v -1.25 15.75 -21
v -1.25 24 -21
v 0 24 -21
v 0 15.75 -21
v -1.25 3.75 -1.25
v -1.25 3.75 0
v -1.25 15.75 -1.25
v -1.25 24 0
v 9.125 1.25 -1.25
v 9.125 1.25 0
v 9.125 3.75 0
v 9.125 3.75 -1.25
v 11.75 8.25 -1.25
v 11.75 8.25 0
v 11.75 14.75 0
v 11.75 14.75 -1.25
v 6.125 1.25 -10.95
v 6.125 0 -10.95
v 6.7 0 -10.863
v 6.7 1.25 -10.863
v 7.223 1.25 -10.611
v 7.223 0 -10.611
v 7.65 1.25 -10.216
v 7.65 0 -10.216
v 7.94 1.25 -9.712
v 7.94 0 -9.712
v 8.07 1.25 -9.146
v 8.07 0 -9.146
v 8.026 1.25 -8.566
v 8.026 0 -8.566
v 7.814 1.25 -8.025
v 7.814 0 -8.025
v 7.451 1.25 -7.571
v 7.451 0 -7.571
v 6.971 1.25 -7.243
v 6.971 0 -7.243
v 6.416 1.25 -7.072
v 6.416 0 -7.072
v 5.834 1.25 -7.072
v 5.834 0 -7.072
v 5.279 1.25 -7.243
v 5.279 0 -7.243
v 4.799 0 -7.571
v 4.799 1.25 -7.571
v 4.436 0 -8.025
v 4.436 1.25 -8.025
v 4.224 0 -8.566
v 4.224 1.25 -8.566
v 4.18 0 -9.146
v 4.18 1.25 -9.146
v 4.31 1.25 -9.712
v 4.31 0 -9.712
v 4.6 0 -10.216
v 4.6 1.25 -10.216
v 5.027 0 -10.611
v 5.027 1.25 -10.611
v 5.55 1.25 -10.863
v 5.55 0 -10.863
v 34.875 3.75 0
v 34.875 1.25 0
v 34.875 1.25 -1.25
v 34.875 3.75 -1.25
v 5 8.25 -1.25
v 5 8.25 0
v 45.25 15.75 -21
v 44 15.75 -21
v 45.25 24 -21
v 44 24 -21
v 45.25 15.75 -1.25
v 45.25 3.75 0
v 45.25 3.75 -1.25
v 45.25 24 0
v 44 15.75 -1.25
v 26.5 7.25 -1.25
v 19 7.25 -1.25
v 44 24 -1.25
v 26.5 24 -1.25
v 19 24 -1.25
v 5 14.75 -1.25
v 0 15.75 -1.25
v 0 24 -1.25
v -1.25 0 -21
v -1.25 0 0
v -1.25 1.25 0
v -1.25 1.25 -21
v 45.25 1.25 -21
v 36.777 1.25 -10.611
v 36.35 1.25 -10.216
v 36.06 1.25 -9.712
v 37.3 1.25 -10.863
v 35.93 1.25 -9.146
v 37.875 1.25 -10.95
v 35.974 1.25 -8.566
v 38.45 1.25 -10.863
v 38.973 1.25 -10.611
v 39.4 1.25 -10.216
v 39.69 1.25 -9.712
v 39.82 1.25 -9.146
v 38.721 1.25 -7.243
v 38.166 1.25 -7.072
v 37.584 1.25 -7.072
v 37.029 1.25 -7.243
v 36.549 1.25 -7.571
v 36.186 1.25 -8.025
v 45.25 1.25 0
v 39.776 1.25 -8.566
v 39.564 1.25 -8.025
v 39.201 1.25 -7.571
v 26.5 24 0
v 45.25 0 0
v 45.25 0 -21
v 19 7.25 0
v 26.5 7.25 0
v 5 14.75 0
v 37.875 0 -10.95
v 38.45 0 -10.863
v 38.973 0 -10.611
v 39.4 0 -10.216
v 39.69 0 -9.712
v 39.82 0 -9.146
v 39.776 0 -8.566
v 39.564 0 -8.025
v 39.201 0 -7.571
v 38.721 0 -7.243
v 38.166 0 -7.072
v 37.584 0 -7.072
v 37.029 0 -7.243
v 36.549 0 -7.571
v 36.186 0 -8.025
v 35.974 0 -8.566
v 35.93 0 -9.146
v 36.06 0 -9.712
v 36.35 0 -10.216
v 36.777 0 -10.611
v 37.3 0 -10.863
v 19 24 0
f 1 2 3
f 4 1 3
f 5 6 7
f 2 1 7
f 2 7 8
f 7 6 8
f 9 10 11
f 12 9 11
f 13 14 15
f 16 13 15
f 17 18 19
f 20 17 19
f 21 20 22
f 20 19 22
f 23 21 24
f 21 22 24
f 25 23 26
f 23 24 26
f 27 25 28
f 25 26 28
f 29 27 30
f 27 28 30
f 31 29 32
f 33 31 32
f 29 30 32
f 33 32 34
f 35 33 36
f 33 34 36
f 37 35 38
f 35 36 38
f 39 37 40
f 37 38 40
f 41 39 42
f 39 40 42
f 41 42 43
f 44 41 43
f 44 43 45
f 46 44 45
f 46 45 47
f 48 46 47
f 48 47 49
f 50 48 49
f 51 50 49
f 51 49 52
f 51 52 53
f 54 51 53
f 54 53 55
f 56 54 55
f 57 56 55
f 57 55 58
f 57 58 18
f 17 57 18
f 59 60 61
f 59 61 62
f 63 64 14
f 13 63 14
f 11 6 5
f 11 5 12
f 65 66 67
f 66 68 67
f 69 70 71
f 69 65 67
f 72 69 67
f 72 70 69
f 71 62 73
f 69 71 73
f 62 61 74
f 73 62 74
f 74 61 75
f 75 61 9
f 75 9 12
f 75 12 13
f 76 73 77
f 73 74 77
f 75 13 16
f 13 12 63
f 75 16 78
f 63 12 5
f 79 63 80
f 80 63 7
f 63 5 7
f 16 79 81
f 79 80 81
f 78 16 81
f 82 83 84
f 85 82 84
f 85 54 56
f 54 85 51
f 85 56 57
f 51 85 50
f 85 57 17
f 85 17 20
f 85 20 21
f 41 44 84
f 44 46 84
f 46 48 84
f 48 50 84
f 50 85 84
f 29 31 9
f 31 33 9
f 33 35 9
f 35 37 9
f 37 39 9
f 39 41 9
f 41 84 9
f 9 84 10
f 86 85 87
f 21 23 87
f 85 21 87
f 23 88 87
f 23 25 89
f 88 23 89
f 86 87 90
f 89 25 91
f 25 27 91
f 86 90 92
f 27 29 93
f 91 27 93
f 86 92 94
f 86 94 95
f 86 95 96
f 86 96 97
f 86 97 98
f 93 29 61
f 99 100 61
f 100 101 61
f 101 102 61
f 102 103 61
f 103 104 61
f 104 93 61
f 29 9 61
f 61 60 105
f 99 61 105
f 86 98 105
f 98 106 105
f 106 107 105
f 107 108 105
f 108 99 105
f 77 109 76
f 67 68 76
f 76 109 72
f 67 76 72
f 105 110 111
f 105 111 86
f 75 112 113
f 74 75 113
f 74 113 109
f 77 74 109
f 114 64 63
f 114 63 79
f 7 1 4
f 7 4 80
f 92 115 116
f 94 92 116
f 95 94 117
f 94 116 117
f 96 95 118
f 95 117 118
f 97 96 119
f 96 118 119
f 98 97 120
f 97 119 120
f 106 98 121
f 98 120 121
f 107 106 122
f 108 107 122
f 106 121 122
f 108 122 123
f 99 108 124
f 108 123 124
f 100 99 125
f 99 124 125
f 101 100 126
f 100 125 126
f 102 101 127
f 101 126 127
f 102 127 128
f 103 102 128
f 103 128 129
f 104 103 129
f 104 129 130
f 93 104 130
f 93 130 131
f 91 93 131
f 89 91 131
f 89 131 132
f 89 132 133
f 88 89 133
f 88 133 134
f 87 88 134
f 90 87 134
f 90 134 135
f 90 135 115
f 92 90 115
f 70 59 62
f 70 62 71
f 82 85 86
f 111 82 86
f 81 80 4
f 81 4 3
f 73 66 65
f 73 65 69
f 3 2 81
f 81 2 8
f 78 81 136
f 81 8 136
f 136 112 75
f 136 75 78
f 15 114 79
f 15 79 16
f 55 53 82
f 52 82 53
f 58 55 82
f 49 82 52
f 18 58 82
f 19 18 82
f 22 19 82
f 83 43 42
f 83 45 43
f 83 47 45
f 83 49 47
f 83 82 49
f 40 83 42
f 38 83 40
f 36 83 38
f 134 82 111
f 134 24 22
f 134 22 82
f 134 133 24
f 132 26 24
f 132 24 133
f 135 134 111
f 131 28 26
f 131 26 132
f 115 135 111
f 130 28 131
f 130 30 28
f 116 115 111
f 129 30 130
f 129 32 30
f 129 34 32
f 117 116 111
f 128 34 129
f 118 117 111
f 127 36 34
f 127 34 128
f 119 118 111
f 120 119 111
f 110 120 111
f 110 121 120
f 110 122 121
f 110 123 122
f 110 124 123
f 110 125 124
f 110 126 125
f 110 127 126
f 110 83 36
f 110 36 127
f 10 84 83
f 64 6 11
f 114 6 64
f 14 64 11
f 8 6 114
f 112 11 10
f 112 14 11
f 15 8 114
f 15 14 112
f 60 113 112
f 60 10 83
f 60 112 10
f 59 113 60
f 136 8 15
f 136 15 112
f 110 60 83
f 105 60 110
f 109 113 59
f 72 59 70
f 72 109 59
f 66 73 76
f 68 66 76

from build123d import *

# Parameters (mm, degrees)
SKETCH1_W           = 46.5
SKETCH1_H           = 24
BOSS_EXTRUDE1_DEPTH = 21
SHELL1_T            = -1.25
SKETCH2_W           = 19.75
SKETCH2_H           = 14.5
CUT_EXTRUDE1_DEPTH  = 57.384838388
SKETCH4_W           = 6.75
SKETCH4_H           = 6.5
SKETCH4_W_2         = 7.5
SKETCH4_H_2         = 17
CUT_EXTRUDE3_DEPTH  = 1.25
CUT_EXTRUDE4_REACH  = 57.358
SKETCH6_R           = 1.95
SKETCH7_W           = 10.375
SKETCH7_H           = 2.5
CUT_EXTRUDE5_DEPTH  = 1.25


with BuildPart() as part:
    # Sketch1 → Boss-Extrude1 (new body)
    with BuildSketch(Plane.XY):
        with Locations((22, 12)):
            Rectangle(SKETCH1_W, SKETCH1_H)
    extrude(amount=-BOSS_EXTRUDE1_DEPTH)

    # Shell1
    shell1_openings = [part.faces().sort_by_distance(p)[0] for p in [
        (22, 12, -21),
        (22, 24, -10.5),
    ]]
    offset(amount=SHELL1_T, openings=shell1_openings, kind=Kind.INTERSECTION)

    # Sketch2 → Cut-Extrude1 (cut, through all)
    with BuildSketch(Plane.ZY.offset(1.25)):
        with Locations((-11.125, 8.5)):
            Rectangle(SKETCH2_W, SKETCH2_H)
    extrude(amount=-CUT_EXTRUDE1_DEPTH, mode=Mode.SUBTRACT)

    # Sketch4 → Cut-Extrude3 (cut)
    with BuildSketch(Plane.XY):
        with Locations((8.375, 11.5)):
            Rectangle(SKETCH4_W, SKETCH4_H)
        with Locations((22.75, 15.75)):
            Rectangle(SKETCH4_W_2, SKETCH4_H_2)
    extrude(amount=-CUT_EXTRUDE3_DEPTH, mode=Mode.SUBTRACT)

    # Sketch6 → Cut-Extrude4 (cut, up to next)
    with BuildSketch(Plane(origin=(0, 0, 0), x_dir=(-1, 0, 0), z_dir=(0, -1, 0)), mode=Mode.PRIVATE) as cut_extrude4_sk1:
        with Locations(Location((-6.125, 9, 0), (0, 0, 90))):
            Circle(SKETCH6_R)
    cut_extrude4_tool1 = extrude(cut_extrude4_sk1.sketch, amount=-CUT_EXTRUDE4_REACH, mode=Mode.PRIVATE) & part.part
    # Sketch6 → Cut-Extrude4 (cut, up to next)
    with BuildSketch(Plane(origin=(0, 0, 0), x_dir=(-1, 0, 0), z_dir=(0, -1, 0)), mode=Mode.PRIVATE) as cut_extrude4_sk2:
        with Locations(Location((-37.875, 9, 0), (0, 0, 90))):
            Circle(SKETCH6_R)
    cut_extrude4_tool2 = extrude(cut_extrude4_sk2.sketch, amount=-CUT_EXTRUDE4_REACH, mode=Mode.PRIVATE) & part.part
    add(cut_extrude4_tool1.solids().sort_by_distance((6.125, 0, -9))[0], mode=Mode.SUBTRACT)
    add(cut_extrude4_tool2.solids().sort_by_distance((37.875, 0, -9))[0], mode=Mode.SUBTRACT)

    # Sketch7 → Cut-Extrude5 (cut)
    with BuildSketch(Plane.XY):
        with Locations((40.0625, 2.5)):
            Rectangle(SKETCH7_W, SKETCH7_H)
        with Locations((3.9375, 2.5)):
            Rectangle(SKETCH7_W, SKETCH7_H)
    extrude(amount=-CUT_EXTRUDE5_DEPTH, mode=Mode.SUBTRACT)


solid = part.part
